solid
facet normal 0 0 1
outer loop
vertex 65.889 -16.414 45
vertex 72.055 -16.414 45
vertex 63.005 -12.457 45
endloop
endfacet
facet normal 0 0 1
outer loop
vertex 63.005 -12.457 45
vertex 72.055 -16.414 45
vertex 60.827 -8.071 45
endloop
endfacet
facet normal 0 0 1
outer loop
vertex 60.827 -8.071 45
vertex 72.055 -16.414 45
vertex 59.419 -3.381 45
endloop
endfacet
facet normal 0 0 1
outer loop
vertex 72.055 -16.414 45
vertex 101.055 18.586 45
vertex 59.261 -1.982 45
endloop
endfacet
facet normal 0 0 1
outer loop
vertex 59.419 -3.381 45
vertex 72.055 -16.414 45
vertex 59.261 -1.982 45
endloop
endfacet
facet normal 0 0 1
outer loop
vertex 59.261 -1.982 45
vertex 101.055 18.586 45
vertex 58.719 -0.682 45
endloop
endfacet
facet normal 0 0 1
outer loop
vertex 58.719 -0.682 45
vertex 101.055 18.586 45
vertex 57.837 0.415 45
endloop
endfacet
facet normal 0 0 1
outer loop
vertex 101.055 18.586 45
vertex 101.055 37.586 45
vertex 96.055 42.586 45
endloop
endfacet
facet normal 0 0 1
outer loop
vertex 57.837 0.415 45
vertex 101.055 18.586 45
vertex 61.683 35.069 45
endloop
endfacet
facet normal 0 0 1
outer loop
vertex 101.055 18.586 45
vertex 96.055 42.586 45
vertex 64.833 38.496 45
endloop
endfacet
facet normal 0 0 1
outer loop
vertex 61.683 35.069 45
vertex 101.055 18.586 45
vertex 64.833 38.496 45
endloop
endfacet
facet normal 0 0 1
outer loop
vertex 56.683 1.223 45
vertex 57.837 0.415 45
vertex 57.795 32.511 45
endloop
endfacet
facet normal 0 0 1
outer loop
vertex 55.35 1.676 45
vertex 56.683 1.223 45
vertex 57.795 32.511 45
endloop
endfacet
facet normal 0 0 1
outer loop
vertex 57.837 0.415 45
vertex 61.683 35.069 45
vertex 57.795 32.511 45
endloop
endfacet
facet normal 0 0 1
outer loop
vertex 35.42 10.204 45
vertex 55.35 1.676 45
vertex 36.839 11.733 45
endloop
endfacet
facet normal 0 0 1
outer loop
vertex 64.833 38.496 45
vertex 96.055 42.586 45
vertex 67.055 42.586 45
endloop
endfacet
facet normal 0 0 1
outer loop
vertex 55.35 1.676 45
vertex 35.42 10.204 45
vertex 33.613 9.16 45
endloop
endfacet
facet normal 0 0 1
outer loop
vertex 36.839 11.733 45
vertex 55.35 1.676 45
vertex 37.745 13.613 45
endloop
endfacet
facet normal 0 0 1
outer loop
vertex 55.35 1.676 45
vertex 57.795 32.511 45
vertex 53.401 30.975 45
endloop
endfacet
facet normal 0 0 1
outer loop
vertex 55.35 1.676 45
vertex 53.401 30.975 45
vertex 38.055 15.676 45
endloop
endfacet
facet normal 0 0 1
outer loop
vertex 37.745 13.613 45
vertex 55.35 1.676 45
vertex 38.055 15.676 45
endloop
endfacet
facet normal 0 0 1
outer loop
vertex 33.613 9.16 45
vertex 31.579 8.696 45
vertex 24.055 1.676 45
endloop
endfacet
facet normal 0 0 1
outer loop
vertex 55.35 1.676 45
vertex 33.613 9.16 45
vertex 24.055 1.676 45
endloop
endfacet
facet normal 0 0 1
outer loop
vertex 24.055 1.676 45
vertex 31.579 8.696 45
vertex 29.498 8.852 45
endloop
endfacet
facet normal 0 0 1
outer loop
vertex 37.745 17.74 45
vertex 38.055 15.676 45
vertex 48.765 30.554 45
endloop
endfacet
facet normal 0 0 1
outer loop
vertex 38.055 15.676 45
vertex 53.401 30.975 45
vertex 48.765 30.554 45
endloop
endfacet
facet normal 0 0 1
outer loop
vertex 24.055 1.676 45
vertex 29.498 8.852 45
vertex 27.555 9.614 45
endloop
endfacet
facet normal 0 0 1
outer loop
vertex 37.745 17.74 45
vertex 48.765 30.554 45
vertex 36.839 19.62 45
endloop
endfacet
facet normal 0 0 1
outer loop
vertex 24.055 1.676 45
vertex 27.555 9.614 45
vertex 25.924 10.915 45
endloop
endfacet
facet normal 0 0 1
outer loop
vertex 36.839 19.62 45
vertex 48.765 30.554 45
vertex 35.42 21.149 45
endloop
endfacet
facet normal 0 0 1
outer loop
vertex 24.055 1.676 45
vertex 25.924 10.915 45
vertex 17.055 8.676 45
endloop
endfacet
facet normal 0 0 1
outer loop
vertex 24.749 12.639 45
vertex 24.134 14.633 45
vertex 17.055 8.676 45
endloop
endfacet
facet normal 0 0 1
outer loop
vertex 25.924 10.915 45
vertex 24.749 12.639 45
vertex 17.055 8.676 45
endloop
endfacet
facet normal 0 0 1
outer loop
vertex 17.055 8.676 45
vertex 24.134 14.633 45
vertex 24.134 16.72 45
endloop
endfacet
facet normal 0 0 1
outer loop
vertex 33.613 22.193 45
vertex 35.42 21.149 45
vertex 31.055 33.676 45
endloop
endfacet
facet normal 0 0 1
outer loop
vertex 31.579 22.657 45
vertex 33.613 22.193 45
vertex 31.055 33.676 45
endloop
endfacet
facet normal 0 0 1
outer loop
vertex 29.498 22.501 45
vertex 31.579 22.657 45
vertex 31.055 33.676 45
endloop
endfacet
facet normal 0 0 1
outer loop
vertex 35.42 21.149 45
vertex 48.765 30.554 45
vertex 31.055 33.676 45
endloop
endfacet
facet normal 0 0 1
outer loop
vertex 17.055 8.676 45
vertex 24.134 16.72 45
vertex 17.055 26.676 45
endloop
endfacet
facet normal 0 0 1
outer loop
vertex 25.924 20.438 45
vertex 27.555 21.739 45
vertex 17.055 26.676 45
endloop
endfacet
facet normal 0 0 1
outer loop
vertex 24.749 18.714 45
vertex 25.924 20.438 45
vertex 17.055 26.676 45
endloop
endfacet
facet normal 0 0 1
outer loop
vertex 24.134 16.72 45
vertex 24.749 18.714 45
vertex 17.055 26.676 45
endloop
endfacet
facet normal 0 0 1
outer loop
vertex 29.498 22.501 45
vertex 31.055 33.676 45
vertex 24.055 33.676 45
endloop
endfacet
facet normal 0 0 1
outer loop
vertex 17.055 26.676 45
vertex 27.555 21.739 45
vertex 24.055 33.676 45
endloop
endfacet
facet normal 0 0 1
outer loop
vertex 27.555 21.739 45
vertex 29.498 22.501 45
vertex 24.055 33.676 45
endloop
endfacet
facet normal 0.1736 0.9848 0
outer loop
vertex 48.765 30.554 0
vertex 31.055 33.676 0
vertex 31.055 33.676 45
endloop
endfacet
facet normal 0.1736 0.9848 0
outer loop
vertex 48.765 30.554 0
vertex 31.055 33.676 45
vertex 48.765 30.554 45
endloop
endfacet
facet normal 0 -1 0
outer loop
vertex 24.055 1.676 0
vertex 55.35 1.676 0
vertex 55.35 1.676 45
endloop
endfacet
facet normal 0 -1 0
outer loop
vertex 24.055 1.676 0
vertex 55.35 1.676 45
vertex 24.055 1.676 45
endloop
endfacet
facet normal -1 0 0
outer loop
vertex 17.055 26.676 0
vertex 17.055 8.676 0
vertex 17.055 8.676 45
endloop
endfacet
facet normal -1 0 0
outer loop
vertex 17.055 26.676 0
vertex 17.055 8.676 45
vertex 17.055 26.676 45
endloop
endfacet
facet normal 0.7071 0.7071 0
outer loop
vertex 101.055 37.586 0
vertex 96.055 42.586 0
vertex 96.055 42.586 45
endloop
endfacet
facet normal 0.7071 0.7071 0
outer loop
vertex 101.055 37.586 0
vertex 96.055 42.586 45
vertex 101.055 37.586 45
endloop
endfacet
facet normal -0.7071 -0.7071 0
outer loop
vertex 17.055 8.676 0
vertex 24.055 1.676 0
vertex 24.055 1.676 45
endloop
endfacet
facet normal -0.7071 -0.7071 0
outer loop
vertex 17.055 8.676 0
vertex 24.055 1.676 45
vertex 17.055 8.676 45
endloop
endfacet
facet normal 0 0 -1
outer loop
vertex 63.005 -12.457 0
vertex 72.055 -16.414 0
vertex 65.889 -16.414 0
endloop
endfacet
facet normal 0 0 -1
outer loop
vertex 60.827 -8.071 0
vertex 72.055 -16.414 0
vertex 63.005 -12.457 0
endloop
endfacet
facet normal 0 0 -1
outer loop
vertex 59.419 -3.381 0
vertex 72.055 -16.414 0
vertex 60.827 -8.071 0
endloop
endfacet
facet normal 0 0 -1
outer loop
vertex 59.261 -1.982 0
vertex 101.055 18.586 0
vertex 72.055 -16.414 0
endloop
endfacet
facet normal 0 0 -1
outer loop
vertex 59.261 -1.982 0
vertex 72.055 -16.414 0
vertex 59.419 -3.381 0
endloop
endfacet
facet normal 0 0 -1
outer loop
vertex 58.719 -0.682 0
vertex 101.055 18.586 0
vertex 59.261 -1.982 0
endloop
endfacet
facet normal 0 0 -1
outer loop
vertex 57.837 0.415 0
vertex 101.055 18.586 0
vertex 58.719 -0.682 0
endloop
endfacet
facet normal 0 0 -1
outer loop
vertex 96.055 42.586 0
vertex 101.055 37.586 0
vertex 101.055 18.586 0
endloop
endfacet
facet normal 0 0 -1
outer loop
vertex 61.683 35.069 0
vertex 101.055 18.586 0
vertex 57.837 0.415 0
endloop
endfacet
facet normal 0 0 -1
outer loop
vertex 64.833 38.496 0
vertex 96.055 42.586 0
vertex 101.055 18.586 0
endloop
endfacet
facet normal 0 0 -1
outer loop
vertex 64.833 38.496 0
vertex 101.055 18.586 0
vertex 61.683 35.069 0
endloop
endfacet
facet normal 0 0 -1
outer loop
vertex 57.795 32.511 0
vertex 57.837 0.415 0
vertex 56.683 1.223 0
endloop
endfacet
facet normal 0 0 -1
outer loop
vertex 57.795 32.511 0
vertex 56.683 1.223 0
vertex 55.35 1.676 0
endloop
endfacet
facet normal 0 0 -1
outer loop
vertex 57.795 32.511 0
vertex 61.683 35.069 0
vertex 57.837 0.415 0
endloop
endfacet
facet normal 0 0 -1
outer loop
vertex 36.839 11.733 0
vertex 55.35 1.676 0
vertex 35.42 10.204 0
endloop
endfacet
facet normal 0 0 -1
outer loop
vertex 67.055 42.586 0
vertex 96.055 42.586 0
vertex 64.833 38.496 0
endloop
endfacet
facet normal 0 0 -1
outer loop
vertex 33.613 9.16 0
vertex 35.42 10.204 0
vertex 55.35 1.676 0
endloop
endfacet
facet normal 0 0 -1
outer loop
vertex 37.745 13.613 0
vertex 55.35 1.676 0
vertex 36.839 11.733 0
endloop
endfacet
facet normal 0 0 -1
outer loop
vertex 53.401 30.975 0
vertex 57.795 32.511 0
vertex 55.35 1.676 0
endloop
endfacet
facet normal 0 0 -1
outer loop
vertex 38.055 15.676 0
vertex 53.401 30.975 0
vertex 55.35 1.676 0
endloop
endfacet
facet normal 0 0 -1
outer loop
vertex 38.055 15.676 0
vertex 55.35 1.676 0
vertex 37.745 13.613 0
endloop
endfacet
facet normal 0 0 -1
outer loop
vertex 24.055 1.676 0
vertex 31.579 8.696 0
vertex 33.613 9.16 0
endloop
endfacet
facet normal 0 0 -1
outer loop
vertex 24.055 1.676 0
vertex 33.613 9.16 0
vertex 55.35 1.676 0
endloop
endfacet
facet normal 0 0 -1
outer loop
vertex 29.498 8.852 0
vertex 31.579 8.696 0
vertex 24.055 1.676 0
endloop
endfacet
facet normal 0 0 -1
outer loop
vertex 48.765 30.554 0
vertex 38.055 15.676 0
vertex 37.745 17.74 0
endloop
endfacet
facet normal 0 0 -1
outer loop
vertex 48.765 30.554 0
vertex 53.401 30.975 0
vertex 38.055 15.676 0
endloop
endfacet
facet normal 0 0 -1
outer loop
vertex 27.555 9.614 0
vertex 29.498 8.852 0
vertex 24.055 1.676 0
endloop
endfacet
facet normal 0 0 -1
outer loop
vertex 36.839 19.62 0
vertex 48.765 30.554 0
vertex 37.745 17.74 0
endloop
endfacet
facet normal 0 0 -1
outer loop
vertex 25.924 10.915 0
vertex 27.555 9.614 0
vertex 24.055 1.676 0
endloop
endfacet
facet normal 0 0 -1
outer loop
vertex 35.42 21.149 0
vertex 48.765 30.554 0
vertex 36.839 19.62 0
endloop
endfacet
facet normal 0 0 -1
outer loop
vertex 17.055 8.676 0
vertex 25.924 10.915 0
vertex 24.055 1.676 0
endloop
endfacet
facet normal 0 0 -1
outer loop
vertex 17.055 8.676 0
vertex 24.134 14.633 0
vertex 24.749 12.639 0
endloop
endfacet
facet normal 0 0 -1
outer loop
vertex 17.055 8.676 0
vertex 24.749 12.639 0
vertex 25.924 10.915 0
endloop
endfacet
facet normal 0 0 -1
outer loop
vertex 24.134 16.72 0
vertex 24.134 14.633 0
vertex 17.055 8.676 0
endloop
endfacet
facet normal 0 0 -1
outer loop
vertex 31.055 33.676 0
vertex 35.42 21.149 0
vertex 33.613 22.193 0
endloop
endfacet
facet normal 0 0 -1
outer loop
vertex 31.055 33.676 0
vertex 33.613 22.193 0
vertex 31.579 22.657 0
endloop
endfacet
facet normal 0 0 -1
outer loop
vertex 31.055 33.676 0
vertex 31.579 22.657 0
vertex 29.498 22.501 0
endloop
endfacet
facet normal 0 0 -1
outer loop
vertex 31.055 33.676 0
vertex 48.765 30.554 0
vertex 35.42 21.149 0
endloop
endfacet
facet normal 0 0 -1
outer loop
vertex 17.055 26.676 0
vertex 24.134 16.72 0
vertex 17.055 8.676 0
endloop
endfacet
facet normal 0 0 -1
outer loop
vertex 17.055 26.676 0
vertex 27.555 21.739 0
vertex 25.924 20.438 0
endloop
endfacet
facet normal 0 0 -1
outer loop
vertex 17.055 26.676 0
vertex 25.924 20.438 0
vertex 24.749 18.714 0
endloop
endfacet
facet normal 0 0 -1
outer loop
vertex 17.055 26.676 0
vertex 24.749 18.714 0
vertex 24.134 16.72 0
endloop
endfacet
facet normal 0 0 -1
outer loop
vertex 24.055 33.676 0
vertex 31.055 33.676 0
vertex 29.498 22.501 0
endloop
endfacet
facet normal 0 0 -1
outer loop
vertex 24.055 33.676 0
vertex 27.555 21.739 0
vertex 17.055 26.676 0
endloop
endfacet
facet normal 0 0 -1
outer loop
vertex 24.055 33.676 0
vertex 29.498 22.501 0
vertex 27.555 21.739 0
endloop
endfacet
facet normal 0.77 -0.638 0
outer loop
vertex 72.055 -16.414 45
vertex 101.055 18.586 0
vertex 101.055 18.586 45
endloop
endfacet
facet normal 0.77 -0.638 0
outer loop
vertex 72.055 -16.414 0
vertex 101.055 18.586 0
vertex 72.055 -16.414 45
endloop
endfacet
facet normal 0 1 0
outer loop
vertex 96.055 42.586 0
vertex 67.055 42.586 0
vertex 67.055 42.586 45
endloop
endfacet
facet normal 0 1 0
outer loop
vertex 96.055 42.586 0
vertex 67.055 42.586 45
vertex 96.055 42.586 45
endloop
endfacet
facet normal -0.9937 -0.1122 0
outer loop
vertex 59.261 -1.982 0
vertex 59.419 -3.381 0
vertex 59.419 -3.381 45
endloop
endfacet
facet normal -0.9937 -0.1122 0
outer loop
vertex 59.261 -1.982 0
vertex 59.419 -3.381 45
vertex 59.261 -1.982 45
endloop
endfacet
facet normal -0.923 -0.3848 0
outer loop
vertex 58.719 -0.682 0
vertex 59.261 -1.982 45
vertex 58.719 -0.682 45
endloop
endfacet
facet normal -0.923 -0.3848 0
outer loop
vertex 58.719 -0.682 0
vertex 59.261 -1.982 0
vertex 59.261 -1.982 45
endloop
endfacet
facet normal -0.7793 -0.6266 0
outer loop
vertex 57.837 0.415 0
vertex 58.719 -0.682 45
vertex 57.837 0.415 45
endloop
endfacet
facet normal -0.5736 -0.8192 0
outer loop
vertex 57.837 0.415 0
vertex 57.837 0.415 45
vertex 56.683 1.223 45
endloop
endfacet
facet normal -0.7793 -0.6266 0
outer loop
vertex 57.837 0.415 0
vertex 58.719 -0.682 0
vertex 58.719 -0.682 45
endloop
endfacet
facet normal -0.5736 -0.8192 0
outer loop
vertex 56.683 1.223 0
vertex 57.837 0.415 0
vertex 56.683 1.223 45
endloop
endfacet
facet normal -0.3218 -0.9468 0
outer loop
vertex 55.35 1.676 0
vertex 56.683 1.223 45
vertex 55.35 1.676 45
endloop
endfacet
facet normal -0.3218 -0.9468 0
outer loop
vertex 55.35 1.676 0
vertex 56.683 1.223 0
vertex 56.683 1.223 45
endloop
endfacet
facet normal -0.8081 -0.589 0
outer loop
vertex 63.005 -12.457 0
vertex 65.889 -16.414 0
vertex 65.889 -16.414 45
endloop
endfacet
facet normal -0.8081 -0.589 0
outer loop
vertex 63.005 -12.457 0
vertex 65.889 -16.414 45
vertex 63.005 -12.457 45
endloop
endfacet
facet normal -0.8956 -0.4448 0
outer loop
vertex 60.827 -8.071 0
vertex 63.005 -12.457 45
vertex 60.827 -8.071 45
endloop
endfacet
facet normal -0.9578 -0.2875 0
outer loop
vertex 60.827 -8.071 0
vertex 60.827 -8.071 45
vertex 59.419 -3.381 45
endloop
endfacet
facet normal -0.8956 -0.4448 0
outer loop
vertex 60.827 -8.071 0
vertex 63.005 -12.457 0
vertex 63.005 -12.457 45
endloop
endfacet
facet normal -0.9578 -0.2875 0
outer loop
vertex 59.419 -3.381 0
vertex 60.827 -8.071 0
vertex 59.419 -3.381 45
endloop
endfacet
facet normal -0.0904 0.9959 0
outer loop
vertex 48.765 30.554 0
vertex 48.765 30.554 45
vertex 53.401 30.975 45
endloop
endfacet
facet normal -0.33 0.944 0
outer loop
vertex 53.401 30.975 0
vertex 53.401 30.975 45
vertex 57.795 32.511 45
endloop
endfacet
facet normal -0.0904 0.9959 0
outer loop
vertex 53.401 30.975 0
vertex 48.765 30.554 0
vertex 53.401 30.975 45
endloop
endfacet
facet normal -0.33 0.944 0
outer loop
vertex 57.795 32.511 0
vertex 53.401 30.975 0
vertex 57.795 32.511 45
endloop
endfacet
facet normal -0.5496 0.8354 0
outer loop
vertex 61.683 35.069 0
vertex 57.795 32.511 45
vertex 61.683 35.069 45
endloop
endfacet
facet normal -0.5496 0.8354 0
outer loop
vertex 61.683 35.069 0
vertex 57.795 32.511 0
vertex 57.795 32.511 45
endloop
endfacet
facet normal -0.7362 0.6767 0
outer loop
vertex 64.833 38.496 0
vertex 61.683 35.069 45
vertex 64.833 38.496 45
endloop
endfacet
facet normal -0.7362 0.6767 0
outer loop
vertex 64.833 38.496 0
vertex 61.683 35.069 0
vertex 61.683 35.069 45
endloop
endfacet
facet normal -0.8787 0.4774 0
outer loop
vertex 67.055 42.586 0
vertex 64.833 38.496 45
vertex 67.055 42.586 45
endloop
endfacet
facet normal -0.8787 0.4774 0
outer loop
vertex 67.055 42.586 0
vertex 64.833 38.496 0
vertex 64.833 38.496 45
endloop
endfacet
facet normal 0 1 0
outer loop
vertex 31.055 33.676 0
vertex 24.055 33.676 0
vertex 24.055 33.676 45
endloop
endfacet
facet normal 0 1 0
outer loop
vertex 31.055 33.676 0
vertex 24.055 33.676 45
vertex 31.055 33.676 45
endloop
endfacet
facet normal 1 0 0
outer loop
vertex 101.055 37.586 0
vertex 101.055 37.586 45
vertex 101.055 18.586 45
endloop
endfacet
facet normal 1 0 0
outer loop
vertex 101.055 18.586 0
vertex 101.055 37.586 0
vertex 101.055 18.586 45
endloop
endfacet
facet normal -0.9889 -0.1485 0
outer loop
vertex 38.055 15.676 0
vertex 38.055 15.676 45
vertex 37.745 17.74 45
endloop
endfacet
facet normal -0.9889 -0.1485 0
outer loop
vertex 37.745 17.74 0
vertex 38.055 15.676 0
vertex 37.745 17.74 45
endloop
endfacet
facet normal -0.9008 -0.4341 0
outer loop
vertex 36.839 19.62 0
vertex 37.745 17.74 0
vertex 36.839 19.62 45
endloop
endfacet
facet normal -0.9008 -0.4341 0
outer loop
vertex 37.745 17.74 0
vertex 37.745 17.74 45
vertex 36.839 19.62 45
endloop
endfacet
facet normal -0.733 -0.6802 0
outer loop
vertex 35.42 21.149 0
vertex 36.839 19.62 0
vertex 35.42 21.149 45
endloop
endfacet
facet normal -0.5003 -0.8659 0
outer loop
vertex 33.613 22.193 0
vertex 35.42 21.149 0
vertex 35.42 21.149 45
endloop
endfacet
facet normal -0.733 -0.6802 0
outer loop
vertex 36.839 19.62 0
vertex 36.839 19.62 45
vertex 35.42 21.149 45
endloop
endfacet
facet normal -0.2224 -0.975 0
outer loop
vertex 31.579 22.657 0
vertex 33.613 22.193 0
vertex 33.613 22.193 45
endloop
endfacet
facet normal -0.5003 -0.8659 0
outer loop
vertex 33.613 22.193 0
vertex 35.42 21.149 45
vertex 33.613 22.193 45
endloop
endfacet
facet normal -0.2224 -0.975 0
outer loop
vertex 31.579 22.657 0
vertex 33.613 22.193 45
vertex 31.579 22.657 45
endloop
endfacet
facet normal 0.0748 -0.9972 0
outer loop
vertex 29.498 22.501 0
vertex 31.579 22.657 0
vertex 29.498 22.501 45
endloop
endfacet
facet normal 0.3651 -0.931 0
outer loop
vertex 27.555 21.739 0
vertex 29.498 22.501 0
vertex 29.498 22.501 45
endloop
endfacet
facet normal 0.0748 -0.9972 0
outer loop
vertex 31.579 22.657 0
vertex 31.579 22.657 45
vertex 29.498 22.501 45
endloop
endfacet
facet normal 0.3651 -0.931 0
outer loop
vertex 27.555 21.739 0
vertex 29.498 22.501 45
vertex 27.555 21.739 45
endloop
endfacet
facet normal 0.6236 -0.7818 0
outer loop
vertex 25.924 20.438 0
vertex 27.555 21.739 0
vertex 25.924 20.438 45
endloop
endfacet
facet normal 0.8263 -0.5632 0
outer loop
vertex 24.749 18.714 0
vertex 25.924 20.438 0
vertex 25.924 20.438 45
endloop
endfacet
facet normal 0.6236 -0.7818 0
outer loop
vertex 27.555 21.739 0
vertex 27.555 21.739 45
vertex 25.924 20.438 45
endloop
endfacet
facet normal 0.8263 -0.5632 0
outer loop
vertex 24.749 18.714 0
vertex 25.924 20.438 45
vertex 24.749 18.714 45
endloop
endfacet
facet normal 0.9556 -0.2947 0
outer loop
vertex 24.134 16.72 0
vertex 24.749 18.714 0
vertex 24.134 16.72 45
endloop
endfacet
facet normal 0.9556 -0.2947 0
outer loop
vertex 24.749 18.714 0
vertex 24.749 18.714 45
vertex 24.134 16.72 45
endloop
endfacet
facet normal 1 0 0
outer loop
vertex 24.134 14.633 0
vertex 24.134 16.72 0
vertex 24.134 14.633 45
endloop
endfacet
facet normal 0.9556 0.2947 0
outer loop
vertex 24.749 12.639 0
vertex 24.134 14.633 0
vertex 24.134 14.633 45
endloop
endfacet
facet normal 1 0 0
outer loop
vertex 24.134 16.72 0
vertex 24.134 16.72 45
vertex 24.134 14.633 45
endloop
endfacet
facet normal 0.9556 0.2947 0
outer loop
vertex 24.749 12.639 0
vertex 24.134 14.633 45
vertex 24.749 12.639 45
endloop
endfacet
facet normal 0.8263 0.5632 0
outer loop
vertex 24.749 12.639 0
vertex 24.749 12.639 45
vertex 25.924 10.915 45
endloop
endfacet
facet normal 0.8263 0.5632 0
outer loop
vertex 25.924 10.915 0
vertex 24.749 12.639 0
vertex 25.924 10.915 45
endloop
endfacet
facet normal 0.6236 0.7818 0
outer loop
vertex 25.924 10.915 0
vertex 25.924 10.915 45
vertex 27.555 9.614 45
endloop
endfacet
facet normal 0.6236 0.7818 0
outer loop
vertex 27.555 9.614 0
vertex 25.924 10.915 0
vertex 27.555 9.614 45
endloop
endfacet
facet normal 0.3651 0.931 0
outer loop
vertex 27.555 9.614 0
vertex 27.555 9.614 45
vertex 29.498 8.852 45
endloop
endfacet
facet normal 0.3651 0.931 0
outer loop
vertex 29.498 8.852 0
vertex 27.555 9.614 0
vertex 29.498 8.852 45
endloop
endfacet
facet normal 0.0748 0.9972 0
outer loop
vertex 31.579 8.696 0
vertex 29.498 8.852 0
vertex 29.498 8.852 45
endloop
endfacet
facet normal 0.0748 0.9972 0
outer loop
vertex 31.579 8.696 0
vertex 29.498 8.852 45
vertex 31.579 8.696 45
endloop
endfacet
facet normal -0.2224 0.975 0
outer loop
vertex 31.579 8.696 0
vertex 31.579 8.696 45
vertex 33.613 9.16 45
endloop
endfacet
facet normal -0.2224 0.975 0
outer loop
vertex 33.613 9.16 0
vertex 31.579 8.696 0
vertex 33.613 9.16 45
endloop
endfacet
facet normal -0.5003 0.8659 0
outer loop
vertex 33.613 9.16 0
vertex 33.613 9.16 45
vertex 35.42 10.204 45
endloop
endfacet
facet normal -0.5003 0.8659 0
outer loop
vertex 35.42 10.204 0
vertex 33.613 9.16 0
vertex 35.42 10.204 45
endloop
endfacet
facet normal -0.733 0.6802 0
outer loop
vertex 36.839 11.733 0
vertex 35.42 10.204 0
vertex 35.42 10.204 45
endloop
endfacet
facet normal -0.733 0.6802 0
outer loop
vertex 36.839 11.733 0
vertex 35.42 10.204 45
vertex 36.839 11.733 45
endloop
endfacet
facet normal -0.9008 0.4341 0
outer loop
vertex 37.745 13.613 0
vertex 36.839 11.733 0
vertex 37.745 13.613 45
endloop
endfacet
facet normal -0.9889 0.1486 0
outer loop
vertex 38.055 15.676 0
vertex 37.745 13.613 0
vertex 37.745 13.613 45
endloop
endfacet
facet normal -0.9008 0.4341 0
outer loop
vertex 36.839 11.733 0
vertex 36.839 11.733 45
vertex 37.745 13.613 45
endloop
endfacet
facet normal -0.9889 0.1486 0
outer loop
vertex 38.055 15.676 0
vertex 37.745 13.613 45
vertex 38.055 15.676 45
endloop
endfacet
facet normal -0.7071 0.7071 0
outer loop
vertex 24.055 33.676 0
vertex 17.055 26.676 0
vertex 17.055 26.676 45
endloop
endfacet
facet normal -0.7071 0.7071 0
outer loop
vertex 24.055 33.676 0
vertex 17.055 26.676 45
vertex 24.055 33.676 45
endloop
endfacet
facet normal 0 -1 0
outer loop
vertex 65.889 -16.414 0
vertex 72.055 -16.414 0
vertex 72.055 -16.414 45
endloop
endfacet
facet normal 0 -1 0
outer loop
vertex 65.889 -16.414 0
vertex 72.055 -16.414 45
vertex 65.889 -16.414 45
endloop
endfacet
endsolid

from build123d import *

# Parameters (mm, degrees)
BOSS_EXTRU_1_DEPTH      = 45
ESQUISSE2_R             = 7
ENL_V_MAT_EXTRU_1_DEPTH = 45


with BuildPart() as part:
    # Esquisse1 → Boss.-Extru.1 (new body)
    with BuildSketch(Plane.XY):
        with BuildLine():
            Line((67.055498862, 42.585779817), (96.055498862, 42.585779817))
            Line((96.055498862, 42.585779817), (101.055498862, 37.585779817))
            Line((101.055498862, 37.585779817), (101.055498862, 18.585779817))
            Line((101.055498862, 18.585779817), (72.055498862, -16.414220183))
            Line((72.055498862, -16.414220183), (65.889453705, -16.414220183))
            ThreePointArc((65.889453705, -16.414220183), (61.82352383, -10.310269713), (59.418933012, -3.381493479))
            ThreePointArc((59.418933012, -3.381493479), (58.316949941, -0.102489997), (55.350190939, 1.676434271))
            Line((55.350190939, 1.676434271), (24.055498862, 1.676434271))
            Line((24.055498862, 1.676434271), (17.055498862, 8.676434271))
            Line((17.055498862, 8.676434271), (17.055498862, 26.676434271))
            Line((17.055498862, 26.676434271), (24.055498862, 33.676434271))
            Line((24.055498862, 33.676434271), (31.055498862, 33.676434271))
            Line((31.055498862, 33.676434271), (48.765077496, 30.553757741))
            ThreePointArc((48.765077496, 30.553757741), (59.817474753, 33.670568141), (67.055498862, 42.585779817))
        make_face()
    extrude(amount=BOSS_EXTRU_1_DEPTH)

    # Esquisse2 → Enlèv. mat.-Extru.1 (cut)
    with BuildSketch(Plane.XY.offset(45)):
        with Locations((31.055498862, 15.676434271)):
            Circle(ESQUISSE2_R)
    extrude(amount=-ENL_V_MAT_EXTRU_1_DEPTH, mode=Mode.SUBTRACT)


solid = part.part
